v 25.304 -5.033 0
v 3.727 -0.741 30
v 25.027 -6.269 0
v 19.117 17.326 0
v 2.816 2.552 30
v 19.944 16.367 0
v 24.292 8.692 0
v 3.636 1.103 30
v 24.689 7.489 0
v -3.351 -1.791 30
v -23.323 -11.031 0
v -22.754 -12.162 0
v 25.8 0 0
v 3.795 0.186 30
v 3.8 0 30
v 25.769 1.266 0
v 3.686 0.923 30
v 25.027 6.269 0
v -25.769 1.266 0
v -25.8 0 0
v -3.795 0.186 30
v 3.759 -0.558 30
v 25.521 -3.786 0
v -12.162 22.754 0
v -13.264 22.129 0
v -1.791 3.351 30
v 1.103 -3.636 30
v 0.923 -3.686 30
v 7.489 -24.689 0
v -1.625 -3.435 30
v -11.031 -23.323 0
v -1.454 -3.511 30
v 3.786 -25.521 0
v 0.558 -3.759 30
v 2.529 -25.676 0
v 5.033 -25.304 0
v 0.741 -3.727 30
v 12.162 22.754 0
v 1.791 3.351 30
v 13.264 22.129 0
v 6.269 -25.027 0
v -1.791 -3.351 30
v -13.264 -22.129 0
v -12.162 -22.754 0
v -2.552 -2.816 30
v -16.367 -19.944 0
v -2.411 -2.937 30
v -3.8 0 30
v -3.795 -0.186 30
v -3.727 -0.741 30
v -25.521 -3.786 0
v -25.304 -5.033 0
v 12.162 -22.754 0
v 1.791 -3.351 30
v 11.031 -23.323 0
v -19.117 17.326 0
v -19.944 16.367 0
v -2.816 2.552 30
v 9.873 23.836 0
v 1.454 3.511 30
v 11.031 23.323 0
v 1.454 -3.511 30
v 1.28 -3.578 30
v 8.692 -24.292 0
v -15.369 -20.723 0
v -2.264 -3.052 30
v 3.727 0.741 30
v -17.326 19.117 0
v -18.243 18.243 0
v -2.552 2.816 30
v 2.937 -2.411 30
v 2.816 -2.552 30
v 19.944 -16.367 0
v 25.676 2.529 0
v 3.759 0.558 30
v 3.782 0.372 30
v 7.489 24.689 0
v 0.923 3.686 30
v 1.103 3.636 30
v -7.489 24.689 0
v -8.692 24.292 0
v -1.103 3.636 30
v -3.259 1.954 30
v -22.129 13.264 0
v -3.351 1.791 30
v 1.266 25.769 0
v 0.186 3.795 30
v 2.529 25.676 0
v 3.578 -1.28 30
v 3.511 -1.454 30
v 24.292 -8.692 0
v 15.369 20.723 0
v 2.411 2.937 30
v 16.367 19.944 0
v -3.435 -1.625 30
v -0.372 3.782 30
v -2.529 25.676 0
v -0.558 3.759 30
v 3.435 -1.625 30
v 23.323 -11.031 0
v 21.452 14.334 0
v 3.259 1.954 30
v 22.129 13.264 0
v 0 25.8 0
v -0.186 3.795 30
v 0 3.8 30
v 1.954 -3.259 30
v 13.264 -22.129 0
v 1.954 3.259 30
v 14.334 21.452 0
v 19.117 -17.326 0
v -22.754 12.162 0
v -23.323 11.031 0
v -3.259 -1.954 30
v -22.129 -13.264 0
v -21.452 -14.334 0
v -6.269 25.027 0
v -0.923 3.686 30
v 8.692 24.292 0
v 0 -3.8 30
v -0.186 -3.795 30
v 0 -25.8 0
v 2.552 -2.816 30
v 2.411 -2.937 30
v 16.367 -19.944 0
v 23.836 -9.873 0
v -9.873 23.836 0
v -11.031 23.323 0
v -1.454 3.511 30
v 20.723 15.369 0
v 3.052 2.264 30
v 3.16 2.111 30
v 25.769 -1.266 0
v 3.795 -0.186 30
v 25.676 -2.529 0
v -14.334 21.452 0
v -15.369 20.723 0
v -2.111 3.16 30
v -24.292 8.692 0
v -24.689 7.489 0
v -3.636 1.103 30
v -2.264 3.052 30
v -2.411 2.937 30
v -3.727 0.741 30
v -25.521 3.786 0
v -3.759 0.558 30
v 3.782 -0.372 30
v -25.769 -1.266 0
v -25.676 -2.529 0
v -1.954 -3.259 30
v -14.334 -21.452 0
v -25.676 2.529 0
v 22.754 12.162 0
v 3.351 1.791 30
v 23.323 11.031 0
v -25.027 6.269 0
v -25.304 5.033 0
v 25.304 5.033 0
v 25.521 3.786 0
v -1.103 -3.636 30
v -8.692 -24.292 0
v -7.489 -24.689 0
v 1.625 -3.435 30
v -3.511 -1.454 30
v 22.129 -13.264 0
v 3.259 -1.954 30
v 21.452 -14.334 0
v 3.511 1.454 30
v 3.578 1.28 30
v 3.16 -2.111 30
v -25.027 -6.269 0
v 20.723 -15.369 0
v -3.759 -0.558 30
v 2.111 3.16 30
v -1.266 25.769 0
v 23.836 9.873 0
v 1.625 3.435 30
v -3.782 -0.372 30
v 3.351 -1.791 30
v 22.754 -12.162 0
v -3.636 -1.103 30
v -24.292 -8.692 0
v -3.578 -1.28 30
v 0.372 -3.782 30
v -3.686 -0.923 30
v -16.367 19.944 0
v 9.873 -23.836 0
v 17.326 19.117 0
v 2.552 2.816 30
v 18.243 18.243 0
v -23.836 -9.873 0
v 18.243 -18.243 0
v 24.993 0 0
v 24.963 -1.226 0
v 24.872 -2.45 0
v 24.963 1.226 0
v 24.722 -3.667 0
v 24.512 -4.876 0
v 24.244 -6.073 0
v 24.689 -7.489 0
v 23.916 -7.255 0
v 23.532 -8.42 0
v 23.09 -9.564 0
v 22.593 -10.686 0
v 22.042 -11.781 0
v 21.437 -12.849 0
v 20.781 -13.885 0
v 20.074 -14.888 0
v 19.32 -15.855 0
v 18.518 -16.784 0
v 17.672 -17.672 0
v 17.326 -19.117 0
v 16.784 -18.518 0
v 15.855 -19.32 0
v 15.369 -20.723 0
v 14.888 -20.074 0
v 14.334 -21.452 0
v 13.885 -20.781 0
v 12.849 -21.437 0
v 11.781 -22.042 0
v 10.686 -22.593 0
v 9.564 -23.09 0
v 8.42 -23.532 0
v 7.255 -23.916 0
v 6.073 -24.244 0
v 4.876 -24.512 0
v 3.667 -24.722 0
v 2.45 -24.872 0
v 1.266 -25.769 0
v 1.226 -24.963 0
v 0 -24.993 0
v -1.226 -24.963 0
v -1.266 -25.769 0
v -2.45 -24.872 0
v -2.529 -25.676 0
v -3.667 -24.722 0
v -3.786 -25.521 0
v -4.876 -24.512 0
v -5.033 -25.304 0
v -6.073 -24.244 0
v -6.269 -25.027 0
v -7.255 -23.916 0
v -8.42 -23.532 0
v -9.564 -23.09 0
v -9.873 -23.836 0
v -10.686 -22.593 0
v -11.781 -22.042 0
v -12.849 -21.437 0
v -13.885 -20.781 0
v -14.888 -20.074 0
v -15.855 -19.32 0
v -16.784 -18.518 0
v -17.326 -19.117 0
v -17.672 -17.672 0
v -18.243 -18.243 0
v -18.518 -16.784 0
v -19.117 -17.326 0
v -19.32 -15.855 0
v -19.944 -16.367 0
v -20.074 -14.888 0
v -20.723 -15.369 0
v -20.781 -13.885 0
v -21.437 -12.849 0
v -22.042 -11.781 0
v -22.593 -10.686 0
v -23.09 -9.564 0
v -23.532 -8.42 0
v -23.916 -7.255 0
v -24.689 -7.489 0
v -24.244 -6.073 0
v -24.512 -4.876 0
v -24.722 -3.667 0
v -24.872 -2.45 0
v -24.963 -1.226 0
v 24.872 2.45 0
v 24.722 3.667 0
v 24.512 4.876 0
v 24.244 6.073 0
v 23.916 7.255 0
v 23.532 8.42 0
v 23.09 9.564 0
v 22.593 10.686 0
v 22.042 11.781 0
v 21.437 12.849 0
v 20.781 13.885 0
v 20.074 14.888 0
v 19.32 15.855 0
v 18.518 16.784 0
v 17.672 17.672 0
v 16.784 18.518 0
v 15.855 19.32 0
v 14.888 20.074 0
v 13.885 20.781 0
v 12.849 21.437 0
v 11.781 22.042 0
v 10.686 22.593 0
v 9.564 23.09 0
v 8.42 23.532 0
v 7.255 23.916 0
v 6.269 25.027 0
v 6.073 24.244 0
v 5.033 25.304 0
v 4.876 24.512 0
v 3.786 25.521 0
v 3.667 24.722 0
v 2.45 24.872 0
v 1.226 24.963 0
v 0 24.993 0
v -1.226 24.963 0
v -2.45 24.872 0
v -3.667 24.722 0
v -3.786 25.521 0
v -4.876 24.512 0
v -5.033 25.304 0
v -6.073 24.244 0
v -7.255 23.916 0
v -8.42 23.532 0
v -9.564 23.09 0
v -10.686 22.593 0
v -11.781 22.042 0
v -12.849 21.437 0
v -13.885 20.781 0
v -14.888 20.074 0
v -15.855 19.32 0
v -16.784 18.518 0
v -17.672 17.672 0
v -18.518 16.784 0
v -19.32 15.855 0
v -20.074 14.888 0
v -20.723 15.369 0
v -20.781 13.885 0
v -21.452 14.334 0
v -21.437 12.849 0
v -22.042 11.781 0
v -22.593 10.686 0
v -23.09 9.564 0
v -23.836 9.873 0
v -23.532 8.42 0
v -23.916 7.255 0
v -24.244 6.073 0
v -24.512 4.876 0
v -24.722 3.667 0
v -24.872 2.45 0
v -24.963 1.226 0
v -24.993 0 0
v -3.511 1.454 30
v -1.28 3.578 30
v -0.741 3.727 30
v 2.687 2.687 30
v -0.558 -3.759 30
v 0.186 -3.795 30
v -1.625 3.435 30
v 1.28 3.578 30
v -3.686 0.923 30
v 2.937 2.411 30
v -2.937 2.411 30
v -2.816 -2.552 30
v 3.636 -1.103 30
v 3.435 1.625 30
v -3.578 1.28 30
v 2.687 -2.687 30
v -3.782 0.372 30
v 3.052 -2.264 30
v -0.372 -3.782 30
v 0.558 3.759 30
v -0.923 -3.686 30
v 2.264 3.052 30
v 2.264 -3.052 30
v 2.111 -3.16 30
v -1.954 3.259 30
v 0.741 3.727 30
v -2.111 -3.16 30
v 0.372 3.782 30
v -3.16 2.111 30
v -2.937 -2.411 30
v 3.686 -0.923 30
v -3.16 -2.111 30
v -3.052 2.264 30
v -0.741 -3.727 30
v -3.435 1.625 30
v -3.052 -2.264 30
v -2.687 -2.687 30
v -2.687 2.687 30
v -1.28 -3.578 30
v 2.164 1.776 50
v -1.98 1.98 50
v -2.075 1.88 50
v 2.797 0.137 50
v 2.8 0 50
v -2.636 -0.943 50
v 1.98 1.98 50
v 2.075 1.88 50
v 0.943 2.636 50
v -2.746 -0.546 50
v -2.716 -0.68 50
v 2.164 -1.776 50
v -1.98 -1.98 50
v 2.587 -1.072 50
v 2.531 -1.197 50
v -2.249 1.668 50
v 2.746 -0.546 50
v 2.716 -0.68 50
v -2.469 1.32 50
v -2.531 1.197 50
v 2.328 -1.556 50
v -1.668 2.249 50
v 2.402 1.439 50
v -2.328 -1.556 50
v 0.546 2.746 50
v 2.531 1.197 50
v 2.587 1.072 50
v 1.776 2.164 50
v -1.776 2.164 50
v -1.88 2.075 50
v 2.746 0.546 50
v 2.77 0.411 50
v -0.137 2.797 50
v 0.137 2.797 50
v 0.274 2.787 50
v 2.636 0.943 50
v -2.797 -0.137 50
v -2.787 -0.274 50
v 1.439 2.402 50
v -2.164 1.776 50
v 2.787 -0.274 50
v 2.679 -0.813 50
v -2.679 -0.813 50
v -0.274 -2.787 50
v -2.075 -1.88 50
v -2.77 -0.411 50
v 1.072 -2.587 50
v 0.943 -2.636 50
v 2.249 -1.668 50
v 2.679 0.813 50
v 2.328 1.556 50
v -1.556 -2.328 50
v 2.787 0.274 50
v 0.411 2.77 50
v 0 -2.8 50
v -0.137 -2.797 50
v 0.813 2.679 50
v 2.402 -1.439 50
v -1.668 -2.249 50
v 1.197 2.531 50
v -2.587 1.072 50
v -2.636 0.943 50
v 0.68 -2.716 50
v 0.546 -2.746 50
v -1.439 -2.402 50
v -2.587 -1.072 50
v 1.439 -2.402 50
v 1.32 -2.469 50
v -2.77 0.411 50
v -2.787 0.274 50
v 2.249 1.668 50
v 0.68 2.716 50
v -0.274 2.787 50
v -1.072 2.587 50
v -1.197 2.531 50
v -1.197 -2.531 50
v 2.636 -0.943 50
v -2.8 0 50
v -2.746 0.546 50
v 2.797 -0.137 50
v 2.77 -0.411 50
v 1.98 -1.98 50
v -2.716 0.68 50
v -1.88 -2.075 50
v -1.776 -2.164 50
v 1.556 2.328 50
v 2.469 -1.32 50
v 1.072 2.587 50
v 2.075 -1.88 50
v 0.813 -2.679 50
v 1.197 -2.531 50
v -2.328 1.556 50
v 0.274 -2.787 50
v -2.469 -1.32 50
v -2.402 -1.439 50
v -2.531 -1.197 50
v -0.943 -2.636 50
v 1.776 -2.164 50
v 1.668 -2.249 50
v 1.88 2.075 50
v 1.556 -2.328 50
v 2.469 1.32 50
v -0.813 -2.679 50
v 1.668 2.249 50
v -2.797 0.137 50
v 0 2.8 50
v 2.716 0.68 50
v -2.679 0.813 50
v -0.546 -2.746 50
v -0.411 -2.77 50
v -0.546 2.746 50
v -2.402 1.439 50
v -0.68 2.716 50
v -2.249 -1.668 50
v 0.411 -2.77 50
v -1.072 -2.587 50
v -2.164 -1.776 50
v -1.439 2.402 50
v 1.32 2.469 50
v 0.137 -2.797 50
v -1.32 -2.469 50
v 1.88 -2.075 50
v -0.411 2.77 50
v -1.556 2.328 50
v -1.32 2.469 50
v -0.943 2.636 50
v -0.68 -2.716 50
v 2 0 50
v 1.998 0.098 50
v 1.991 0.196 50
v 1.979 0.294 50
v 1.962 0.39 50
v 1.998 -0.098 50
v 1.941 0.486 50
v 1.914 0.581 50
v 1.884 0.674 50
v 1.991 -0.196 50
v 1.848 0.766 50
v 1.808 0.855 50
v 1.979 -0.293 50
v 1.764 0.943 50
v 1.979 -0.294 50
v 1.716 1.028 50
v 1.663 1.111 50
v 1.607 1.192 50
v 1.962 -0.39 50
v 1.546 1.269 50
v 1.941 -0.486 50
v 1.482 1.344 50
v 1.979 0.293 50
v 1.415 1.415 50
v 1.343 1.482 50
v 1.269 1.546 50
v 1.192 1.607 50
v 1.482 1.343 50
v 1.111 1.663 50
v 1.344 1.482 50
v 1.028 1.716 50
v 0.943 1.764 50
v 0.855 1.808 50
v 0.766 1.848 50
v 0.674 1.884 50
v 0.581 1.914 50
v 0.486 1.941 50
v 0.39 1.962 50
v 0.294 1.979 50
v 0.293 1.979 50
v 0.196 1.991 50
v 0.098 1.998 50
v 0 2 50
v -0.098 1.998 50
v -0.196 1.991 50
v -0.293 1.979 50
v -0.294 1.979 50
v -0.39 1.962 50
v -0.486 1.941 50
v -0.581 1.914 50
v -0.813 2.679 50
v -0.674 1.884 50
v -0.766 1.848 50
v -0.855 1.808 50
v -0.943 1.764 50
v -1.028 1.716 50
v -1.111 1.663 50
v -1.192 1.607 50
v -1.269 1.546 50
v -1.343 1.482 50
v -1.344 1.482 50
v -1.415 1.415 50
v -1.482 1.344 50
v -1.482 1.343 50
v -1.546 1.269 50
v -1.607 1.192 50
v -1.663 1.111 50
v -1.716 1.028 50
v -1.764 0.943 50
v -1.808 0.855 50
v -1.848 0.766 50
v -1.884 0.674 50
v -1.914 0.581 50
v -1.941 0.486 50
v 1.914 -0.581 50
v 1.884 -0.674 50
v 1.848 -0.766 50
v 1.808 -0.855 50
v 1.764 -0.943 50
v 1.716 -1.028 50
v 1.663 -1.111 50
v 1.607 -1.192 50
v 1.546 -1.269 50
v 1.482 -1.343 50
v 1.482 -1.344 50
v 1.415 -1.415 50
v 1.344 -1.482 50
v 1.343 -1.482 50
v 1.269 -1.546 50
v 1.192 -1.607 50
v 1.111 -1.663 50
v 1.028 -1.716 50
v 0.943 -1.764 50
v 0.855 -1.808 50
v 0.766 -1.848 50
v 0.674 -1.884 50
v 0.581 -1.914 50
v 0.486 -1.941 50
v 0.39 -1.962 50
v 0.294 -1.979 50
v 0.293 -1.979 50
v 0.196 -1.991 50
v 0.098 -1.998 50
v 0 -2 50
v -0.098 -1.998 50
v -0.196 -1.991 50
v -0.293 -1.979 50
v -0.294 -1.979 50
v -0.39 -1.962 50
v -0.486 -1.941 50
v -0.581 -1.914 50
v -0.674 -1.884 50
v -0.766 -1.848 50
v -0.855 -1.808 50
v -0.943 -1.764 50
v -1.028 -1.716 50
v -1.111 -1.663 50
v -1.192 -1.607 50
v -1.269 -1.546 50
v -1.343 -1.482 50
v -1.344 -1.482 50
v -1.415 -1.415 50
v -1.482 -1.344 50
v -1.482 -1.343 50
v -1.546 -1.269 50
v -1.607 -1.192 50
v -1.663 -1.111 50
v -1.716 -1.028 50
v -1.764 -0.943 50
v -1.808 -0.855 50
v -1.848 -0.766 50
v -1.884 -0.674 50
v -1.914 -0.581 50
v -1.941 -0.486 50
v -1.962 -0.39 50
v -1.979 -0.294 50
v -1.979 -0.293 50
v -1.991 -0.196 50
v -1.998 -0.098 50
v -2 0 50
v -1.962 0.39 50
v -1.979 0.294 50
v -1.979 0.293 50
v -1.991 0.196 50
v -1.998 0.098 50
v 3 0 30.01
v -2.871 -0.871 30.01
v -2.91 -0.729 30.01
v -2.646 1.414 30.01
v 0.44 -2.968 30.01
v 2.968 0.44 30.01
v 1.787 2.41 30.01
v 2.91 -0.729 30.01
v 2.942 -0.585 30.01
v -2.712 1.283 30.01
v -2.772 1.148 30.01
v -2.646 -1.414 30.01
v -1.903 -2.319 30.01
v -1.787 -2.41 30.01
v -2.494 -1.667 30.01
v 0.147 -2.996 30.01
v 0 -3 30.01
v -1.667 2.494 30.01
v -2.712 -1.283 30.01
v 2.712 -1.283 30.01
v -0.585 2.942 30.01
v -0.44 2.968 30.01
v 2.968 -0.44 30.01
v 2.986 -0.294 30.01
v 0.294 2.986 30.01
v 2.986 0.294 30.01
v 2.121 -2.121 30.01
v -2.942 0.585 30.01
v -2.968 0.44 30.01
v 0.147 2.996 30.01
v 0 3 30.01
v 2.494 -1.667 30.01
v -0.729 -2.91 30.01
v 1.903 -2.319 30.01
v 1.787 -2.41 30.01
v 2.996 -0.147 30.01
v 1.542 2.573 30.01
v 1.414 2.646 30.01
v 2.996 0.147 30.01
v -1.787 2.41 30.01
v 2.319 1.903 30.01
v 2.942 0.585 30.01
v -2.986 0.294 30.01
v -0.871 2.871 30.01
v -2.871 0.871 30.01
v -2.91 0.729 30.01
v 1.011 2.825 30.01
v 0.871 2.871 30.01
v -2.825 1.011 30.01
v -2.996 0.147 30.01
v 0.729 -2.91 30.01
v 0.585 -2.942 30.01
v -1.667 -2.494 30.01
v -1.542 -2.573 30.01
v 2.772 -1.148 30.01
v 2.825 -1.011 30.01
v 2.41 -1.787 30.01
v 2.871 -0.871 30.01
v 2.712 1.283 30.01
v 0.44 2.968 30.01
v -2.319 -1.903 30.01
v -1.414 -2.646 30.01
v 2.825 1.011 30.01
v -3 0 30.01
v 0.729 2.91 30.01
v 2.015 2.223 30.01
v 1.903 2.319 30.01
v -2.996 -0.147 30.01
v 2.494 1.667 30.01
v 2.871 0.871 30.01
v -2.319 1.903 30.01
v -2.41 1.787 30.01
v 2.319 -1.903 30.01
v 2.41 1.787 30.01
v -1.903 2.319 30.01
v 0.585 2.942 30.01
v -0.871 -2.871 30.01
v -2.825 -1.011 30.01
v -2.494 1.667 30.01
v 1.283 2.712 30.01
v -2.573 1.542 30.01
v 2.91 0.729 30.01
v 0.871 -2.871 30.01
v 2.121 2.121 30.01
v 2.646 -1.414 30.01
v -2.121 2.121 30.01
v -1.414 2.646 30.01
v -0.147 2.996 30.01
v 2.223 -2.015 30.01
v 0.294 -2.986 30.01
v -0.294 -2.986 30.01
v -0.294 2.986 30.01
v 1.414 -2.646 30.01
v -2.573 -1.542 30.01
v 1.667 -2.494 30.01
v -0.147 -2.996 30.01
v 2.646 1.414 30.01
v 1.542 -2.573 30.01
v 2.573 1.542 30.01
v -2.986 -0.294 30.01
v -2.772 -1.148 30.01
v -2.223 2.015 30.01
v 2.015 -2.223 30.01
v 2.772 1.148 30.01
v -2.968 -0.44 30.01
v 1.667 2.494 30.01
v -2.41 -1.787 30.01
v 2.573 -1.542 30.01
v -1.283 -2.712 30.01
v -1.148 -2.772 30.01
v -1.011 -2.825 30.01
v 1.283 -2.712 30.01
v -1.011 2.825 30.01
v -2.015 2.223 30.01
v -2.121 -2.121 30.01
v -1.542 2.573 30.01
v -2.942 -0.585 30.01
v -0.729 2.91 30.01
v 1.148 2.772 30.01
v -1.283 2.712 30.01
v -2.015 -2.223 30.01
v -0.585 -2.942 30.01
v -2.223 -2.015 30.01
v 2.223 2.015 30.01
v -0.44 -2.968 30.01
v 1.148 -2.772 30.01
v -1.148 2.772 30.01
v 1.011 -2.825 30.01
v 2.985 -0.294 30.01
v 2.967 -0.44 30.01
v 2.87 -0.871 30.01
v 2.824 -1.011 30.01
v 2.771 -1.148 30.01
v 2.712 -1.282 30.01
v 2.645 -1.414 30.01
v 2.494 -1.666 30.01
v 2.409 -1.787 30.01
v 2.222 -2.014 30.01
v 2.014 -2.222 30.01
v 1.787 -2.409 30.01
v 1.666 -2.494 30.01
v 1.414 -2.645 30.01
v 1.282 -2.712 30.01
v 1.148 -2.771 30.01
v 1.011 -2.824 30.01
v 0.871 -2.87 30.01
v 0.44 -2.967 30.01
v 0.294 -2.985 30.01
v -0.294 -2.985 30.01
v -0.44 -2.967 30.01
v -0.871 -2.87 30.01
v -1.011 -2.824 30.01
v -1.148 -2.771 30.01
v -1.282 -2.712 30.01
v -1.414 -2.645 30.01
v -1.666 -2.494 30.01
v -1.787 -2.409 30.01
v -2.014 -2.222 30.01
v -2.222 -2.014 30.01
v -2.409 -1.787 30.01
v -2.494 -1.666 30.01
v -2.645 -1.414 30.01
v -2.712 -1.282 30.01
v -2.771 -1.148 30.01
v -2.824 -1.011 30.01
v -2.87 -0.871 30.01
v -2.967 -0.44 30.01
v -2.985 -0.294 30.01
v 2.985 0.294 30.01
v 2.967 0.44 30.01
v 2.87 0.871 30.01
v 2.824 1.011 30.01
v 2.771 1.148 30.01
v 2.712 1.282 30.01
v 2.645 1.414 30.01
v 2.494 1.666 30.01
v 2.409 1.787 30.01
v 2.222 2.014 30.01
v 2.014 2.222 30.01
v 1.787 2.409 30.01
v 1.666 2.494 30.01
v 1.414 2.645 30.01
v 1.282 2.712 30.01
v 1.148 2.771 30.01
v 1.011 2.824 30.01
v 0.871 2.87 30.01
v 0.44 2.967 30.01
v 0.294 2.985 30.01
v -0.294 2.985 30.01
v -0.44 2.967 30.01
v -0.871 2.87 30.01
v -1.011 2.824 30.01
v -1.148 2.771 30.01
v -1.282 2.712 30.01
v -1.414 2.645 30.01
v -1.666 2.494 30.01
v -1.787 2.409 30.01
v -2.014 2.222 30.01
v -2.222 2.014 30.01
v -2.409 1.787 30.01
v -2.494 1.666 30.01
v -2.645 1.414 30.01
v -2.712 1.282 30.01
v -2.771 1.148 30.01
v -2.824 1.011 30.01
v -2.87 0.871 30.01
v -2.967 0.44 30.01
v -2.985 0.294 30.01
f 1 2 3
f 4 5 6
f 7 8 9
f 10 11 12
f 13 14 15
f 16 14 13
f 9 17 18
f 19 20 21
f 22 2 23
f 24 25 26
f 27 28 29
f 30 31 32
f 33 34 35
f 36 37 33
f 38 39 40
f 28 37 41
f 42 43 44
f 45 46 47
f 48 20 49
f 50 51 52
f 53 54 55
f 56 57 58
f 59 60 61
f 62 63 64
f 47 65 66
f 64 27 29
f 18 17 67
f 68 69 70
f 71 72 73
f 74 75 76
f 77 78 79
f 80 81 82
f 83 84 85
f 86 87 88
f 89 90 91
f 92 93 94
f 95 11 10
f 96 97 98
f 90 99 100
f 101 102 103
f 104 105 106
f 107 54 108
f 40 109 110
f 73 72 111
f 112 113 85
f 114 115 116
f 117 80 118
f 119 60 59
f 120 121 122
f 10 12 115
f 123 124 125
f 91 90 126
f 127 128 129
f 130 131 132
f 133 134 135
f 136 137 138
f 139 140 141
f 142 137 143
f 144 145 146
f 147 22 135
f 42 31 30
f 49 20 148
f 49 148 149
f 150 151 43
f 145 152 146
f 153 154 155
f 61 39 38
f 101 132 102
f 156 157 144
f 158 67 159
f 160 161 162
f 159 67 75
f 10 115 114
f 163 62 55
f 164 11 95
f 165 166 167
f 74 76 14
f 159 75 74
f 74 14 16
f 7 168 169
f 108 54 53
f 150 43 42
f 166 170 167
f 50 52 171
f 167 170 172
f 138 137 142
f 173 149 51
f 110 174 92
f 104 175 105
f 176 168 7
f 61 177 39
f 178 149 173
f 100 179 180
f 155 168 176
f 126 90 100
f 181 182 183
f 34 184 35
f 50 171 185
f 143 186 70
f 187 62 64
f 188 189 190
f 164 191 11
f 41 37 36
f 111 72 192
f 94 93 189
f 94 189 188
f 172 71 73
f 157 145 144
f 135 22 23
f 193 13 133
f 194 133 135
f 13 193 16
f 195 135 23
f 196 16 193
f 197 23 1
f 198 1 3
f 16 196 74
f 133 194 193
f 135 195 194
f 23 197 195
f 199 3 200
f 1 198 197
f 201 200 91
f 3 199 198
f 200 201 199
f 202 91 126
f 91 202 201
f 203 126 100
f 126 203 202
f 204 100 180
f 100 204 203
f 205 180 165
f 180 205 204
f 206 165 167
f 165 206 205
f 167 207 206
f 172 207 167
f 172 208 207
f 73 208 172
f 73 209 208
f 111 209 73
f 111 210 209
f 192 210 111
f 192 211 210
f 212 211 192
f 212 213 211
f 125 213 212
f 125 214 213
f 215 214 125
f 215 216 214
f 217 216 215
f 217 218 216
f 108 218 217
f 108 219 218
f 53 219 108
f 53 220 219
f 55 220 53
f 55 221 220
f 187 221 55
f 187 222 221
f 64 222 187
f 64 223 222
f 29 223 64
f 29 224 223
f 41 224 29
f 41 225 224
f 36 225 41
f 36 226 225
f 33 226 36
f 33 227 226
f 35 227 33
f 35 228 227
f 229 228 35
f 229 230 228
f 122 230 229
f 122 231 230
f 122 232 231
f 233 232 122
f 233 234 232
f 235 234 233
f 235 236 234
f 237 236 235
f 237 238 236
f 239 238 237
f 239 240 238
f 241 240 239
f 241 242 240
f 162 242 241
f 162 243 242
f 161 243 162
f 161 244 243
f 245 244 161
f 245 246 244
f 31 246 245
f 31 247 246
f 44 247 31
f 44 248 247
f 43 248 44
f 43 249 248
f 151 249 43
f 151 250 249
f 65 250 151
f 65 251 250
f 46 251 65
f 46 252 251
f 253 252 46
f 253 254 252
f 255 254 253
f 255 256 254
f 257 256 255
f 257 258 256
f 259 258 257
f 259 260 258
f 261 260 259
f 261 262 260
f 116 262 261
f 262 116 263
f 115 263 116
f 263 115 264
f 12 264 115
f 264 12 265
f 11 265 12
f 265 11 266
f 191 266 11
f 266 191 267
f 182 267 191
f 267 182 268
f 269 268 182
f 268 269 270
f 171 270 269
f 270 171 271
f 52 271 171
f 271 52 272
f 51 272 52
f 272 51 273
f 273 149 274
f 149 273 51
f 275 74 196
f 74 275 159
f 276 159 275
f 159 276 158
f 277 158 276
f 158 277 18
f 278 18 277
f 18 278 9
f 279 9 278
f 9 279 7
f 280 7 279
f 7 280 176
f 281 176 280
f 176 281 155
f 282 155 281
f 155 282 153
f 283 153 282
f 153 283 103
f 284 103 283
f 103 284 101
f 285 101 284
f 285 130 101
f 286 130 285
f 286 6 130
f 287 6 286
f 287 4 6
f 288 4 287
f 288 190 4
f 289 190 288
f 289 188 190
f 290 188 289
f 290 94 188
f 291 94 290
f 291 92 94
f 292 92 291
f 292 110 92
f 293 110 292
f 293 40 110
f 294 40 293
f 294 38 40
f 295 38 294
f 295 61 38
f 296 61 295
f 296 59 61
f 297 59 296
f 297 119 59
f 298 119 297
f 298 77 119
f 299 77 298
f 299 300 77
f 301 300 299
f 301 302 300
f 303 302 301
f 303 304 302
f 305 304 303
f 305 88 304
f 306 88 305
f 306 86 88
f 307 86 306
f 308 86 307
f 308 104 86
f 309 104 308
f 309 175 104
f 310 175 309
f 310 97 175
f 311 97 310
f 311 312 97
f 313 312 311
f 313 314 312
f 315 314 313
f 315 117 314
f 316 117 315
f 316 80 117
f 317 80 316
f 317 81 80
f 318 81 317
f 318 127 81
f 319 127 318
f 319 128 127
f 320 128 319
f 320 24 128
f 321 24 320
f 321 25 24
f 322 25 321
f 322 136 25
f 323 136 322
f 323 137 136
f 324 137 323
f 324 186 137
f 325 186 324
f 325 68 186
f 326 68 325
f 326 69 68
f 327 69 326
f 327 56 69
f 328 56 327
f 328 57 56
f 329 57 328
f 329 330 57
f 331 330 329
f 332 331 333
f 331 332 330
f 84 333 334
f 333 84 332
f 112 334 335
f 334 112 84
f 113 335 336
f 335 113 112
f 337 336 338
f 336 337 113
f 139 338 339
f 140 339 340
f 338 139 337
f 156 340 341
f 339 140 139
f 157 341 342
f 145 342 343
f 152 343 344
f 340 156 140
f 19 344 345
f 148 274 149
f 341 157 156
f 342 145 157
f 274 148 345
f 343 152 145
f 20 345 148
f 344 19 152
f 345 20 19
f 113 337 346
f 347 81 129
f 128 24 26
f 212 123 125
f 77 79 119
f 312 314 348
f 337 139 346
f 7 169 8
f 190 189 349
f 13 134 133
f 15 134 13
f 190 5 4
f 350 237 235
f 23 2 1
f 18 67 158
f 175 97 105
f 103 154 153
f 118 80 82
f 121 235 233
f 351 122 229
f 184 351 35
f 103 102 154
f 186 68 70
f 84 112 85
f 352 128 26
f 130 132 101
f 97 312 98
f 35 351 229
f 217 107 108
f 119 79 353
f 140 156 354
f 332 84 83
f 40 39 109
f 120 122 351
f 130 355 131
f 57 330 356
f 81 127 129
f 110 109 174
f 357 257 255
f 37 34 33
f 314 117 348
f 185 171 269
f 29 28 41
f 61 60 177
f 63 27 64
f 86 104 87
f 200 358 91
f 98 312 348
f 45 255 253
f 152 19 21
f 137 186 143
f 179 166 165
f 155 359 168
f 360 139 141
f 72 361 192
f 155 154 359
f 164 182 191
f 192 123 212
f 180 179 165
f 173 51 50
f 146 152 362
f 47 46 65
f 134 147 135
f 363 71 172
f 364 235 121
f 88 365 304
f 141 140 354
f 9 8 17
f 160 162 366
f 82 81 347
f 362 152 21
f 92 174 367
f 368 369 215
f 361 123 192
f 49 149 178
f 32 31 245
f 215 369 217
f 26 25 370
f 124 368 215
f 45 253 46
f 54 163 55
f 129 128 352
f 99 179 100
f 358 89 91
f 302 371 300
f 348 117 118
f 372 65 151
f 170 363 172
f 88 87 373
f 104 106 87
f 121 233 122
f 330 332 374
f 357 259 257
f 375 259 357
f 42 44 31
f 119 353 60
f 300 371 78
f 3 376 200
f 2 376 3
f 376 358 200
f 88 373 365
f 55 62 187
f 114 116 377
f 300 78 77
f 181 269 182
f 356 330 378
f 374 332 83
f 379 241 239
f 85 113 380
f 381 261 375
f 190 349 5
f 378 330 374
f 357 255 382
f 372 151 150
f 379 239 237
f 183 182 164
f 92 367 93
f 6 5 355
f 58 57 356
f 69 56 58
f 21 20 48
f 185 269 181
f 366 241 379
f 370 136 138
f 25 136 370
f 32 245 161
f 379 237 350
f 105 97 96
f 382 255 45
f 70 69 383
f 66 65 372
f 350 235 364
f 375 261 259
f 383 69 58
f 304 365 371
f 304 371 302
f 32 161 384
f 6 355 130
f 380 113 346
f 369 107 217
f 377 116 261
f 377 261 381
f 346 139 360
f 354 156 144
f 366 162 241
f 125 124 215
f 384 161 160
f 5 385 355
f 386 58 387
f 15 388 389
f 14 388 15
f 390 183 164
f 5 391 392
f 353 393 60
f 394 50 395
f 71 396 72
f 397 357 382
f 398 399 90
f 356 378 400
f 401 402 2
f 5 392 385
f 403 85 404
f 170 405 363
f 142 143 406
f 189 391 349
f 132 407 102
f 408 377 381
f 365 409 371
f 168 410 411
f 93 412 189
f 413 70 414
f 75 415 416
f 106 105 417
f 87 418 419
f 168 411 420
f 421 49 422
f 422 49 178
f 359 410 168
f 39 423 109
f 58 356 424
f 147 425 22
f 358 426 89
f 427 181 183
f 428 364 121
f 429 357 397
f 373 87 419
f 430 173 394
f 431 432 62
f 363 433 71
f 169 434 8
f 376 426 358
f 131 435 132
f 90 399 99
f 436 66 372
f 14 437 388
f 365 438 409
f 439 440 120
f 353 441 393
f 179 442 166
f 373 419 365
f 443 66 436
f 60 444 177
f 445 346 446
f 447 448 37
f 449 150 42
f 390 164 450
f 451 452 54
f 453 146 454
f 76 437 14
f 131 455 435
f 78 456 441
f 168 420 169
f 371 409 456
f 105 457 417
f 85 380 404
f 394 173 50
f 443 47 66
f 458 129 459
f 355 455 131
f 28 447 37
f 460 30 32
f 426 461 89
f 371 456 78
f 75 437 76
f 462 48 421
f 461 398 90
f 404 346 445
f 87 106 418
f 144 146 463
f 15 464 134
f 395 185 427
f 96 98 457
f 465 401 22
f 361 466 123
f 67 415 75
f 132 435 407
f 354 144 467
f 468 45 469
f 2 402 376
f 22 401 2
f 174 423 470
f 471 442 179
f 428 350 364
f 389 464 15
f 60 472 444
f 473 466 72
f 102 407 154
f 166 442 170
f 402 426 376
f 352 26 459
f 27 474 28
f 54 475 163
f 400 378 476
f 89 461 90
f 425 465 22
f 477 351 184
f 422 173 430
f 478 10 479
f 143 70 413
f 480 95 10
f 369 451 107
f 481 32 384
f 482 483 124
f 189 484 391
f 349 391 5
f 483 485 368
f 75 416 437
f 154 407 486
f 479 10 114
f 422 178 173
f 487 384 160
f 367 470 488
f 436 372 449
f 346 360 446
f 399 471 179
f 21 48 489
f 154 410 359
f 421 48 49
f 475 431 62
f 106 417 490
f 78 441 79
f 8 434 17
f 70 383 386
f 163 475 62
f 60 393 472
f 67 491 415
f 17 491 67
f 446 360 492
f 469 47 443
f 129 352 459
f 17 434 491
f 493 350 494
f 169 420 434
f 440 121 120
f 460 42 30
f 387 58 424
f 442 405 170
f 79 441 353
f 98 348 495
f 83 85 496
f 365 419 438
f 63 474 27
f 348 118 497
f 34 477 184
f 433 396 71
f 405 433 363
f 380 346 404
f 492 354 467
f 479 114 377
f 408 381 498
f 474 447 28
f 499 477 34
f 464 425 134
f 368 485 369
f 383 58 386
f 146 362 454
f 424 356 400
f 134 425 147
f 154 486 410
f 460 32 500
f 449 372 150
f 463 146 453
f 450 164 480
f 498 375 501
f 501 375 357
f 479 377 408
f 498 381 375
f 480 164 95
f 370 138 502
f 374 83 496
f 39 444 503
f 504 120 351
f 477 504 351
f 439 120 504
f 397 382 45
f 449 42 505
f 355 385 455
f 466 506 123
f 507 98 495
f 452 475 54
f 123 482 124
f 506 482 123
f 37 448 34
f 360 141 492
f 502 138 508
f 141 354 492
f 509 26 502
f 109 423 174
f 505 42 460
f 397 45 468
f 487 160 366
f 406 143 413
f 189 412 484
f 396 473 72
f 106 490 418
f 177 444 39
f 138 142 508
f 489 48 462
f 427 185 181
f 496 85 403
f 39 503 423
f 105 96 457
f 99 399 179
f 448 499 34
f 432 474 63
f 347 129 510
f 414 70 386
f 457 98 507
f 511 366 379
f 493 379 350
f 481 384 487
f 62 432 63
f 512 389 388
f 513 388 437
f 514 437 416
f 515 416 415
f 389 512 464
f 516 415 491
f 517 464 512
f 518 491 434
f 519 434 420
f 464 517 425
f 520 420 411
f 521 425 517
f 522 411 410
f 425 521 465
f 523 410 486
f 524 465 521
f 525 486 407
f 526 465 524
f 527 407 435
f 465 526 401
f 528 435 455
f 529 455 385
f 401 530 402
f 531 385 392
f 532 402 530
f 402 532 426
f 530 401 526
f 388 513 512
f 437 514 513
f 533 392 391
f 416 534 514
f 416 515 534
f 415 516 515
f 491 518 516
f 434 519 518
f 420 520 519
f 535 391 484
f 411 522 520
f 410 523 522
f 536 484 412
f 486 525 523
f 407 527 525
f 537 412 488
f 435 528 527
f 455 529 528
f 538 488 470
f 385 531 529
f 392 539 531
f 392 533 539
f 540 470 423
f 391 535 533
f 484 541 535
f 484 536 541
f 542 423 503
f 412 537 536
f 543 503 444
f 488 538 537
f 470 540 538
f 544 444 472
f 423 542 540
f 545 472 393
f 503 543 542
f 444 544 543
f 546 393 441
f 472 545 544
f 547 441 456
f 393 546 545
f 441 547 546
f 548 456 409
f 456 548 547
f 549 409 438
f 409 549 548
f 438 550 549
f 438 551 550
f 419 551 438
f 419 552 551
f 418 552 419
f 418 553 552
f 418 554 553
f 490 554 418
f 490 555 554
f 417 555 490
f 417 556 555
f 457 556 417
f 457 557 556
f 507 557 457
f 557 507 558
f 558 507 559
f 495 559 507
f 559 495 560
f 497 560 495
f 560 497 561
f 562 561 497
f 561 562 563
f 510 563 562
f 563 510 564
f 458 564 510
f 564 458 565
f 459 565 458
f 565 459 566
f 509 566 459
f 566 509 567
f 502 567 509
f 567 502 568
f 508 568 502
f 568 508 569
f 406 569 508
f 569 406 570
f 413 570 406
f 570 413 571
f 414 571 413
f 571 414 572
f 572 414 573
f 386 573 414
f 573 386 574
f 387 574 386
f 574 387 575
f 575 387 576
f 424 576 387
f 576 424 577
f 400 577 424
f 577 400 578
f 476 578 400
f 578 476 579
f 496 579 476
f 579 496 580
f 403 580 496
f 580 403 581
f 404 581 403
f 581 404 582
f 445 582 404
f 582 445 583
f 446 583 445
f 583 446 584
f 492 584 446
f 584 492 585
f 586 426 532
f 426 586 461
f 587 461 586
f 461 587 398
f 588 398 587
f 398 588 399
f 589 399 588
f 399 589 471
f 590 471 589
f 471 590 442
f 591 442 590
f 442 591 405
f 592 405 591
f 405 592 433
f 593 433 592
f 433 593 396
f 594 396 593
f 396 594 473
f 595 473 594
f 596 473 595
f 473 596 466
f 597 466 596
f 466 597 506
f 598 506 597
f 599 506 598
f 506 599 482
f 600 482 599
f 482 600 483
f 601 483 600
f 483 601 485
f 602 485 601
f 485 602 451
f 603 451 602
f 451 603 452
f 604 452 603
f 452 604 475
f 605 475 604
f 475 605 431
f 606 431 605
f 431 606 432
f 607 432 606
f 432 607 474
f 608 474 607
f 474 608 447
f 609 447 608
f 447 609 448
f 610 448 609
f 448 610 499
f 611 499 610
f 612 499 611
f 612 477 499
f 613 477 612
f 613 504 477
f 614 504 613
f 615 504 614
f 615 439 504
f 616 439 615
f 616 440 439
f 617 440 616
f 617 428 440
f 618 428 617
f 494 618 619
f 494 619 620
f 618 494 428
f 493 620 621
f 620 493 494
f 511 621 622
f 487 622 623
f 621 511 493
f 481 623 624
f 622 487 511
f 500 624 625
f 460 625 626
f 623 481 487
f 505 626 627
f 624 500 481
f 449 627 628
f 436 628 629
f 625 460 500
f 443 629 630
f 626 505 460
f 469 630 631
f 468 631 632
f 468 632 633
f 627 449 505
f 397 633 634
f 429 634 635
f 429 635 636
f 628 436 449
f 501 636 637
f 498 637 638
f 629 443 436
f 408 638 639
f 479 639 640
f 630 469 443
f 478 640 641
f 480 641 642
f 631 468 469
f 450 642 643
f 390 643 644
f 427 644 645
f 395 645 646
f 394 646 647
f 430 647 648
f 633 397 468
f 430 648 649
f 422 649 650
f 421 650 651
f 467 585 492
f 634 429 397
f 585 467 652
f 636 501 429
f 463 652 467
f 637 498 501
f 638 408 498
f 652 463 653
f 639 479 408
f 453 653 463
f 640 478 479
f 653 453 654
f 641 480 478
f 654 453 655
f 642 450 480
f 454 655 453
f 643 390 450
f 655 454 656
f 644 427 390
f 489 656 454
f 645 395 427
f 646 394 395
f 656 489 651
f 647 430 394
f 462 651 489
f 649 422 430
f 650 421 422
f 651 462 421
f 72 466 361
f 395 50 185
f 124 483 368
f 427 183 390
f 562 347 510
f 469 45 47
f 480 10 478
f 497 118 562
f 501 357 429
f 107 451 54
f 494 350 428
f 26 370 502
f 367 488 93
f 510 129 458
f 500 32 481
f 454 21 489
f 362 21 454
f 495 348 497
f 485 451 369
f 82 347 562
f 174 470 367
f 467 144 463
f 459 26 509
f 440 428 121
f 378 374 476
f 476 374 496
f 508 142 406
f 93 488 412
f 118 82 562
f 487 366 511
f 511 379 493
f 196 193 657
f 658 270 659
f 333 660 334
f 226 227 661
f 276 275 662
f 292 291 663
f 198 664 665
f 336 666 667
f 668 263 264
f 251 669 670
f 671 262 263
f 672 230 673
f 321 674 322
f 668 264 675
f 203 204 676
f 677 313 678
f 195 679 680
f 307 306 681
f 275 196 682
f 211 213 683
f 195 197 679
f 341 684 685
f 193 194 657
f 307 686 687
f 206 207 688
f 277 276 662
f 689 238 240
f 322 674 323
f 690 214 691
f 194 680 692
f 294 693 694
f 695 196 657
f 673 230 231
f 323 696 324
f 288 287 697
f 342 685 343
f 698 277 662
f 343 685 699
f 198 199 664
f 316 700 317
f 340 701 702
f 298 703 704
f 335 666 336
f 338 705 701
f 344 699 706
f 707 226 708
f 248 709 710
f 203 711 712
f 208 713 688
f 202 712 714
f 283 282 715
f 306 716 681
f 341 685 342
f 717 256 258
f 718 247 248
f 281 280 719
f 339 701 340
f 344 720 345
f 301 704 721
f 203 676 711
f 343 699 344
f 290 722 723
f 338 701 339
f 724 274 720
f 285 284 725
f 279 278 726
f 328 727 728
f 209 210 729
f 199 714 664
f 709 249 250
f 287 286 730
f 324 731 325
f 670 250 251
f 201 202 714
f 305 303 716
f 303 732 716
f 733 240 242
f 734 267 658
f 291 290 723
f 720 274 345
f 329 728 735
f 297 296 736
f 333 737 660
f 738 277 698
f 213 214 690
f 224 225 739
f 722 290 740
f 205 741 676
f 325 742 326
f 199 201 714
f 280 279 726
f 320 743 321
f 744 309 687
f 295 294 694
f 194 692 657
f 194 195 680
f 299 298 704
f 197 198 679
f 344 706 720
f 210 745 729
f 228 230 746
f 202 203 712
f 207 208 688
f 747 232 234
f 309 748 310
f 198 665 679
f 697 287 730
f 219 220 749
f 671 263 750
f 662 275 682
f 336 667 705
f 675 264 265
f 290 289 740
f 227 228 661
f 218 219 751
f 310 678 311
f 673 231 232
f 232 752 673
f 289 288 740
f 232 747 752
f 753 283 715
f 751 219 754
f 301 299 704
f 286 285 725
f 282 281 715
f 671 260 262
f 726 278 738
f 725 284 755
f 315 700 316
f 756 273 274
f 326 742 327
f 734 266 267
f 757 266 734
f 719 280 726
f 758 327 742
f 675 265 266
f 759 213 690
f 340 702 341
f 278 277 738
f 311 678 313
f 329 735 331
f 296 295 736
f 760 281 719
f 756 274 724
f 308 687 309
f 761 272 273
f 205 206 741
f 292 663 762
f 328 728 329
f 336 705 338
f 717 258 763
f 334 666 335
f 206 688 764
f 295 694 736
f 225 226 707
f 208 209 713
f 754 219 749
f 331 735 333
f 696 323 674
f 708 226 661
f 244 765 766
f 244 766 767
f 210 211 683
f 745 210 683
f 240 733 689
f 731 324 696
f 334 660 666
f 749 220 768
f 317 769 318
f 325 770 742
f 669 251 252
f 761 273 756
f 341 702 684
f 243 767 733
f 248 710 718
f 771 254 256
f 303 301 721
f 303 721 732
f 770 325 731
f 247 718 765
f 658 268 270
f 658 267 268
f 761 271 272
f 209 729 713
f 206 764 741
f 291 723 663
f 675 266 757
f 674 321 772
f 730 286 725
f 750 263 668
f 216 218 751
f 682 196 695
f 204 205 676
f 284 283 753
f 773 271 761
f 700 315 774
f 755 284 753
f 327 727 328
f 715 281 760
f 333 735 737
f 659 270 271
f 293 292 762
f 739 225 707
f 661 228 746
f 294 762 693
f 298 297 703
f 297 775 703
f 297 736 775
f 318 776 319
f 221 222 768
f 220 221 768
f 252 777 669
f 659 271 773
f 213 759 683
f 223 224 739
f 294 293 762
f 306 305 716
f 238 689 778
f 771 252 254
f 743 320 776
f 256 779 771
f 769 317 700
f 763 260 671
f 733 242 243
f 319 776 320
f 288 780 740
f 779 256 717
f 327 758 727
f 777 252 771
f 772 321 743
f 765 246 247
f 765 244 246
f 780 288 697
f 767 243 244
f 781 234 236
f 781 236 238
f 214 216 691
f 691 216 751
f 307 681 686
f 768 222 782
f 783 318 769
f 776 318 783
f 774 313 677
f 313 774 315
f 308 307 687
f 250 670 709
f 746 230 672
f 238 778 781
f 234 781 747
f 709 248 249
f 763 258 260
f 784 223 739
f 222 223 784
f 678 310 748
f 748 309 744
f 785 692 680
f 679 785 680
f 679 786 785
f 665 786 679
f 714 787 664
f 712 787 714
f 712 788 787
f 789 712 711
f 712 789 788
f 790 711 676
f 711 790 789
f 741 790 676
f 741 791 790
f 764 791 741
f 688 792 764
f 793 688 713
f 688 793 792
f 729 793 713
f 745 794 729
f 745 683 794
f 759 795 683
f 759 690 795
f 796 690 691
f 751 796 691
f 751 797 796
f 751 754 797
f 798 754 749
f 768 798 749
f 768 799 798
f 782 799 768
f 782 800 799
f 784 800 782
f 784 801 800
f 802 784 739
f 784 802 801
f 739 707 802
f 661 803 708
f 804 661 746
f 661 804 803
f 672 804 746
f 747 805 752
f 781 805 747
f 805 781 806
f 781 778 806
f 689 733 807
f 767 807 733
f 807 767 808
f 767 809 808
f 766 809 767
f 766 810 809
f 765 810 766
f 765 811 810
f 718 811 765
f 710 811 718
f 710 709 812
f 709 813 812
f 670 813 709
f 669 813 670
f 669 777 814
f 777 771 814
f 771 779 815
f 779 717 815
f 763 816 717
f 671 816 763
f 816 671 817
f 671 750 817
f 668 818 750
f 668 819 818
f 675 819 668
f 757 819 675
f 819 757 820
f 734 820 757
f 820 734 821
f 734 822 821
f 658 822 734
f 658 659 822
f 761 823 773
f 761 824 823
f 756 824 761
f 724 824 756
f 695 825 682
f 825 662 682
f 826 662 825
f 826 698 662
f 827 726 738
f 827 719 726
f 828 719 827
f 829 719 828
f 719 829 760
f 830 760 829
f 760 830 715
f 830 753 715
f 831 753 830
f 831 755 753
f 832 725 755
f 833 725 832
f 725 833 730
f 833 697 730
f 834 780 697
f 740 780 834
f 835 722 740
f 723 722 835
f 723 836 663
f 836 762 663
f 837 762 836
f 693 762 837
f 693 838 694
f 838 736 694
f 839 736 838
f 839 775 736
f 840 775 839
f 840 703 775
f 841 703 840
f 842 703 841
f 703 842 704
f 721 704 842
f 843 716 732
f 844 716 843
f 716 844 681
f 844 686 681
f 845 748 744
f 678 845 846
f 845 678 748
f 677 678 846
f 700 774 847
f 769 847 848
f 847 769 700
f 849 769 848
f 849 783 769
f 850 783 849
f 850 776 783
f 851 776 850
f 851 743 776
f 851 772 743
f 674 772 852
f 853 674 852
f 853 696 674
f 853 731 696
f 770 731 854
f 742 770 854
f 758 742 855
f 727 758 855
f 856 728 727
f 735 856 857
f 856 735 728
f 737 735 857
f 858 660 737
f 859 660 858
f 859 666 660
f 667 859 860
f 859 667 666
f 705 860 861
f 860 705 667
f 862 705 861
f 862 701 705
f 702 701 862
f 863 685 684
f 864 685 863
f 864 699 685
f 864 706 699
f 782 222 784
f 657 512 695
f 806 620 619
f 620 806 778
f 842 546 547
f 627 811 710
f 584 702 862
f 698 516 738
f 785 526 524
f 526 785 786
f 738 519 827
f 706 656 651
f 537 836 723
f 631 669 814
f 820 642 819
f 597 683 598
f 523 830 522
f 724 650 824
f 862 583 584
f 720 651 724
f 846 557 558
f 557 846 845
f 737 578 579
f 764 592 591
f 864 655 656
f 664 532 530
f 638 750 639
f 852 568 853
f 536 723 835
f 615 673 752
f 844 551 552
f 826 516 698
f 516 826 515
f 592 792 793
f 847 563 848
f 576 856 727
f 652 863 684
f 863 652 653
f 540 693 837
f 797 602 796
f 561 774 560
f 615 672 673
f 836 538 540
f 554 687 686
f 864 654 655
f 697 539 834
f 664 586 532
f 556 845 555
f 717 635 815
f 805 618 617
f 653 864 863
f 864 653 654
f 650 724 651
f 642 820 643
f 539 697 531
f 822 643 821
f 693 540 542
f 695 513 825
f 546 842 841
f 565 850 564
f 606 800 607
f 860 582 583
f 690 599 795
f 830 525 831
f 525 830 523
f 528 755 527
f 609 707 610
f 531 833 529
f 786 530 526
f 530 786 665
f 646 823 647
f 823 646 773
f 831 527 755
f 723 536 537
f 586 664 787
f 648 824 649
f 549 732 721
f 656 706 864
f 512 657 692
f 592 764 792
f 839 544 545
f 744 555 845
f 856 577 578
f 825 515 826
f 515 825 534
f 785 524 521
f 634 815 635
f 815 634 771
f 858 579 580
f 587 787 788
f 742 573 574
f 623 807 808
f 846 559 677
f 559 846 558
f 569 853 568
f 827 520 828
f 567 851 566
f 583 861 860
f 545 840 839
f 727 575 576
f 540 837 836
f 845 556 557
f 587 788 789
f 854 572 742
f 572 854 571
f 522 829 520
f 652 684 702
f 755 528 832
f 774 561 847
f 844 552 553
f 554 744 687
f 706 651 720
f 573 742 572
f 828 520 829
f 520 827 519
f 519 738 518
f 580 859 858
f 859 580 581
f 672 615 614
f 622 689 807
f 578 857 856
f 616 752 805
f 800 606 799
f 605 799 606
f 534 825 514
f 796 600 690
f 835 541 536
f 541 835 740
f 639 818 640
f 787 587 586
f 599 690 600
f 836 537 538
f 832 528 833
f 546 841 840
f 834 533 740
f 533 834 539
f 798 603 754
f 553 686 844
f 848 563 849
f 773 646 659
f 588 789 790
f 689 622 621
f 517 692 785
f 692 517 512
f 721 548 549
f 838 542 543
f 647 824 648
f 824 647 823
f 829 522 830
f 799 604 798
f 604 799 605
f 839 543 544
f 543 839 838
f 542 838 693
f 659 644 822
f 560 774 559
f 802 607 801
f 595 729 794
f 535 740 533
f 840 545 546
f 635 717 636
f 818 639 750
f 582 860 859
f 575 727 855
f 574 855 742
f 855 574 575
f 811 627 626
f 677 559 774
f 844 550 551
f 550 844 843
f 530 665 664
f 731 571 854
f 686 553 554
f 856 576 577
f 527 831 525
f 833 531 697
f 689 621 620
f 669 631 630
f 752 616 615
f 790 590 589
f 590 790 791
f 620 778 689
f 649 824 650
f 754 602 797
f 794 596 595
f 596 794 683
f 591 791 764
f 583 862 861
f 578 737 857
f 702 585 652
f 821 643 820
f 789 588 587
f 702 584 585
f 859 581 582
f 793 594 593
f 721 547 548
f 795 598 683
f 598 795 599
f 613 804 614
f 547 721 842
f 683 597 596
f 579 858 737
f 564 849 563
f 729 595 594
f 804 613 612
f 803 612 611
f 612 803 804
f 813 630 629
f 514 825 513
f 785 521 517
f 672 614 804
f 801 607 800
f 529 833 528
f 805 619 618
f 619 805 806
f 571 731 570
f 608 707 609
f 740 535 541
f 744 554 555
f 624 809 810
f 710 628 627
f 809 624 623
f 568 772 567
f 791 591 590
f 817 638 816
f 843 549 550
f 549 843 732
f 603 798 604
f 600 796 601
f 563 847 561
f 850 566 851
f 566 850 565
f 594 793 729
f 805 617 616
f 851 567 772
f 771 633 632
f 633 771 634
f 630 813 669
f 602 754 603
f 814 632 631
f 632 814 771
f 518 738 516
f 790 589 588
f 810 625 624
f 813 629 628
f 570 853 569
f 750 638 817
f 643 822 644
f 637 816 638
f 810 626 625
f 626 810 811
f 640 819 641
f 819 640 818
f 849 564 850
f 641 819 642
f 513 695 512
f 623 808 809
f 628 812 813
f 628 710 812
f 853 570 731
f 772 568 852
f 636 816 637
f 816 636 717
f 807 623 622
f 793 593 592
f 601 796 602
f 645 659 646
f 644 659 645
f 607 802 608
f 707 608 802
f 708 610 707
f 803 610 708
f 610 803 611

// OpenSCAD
$fn=128;
d1=50;
h1=30;
d2=6;
h2=20;
d3=4;
wall=0.8;
difference() {
  union() {
    cylinder(d1=d1+2*wall,d2=d2+2*wall,h=h1);
    translate([0,0,h1])cylinder(d1=d2+2*wall,d2=d3+2*wall,h=h2);
  }
    translate([0,0,-1/100])cylinder(d1=d1,d2=d2,h=h1+2/100);
    translate([0,0,h1])cylinder(d1=d2,d2=d3,h=h2+1/100);  
}
